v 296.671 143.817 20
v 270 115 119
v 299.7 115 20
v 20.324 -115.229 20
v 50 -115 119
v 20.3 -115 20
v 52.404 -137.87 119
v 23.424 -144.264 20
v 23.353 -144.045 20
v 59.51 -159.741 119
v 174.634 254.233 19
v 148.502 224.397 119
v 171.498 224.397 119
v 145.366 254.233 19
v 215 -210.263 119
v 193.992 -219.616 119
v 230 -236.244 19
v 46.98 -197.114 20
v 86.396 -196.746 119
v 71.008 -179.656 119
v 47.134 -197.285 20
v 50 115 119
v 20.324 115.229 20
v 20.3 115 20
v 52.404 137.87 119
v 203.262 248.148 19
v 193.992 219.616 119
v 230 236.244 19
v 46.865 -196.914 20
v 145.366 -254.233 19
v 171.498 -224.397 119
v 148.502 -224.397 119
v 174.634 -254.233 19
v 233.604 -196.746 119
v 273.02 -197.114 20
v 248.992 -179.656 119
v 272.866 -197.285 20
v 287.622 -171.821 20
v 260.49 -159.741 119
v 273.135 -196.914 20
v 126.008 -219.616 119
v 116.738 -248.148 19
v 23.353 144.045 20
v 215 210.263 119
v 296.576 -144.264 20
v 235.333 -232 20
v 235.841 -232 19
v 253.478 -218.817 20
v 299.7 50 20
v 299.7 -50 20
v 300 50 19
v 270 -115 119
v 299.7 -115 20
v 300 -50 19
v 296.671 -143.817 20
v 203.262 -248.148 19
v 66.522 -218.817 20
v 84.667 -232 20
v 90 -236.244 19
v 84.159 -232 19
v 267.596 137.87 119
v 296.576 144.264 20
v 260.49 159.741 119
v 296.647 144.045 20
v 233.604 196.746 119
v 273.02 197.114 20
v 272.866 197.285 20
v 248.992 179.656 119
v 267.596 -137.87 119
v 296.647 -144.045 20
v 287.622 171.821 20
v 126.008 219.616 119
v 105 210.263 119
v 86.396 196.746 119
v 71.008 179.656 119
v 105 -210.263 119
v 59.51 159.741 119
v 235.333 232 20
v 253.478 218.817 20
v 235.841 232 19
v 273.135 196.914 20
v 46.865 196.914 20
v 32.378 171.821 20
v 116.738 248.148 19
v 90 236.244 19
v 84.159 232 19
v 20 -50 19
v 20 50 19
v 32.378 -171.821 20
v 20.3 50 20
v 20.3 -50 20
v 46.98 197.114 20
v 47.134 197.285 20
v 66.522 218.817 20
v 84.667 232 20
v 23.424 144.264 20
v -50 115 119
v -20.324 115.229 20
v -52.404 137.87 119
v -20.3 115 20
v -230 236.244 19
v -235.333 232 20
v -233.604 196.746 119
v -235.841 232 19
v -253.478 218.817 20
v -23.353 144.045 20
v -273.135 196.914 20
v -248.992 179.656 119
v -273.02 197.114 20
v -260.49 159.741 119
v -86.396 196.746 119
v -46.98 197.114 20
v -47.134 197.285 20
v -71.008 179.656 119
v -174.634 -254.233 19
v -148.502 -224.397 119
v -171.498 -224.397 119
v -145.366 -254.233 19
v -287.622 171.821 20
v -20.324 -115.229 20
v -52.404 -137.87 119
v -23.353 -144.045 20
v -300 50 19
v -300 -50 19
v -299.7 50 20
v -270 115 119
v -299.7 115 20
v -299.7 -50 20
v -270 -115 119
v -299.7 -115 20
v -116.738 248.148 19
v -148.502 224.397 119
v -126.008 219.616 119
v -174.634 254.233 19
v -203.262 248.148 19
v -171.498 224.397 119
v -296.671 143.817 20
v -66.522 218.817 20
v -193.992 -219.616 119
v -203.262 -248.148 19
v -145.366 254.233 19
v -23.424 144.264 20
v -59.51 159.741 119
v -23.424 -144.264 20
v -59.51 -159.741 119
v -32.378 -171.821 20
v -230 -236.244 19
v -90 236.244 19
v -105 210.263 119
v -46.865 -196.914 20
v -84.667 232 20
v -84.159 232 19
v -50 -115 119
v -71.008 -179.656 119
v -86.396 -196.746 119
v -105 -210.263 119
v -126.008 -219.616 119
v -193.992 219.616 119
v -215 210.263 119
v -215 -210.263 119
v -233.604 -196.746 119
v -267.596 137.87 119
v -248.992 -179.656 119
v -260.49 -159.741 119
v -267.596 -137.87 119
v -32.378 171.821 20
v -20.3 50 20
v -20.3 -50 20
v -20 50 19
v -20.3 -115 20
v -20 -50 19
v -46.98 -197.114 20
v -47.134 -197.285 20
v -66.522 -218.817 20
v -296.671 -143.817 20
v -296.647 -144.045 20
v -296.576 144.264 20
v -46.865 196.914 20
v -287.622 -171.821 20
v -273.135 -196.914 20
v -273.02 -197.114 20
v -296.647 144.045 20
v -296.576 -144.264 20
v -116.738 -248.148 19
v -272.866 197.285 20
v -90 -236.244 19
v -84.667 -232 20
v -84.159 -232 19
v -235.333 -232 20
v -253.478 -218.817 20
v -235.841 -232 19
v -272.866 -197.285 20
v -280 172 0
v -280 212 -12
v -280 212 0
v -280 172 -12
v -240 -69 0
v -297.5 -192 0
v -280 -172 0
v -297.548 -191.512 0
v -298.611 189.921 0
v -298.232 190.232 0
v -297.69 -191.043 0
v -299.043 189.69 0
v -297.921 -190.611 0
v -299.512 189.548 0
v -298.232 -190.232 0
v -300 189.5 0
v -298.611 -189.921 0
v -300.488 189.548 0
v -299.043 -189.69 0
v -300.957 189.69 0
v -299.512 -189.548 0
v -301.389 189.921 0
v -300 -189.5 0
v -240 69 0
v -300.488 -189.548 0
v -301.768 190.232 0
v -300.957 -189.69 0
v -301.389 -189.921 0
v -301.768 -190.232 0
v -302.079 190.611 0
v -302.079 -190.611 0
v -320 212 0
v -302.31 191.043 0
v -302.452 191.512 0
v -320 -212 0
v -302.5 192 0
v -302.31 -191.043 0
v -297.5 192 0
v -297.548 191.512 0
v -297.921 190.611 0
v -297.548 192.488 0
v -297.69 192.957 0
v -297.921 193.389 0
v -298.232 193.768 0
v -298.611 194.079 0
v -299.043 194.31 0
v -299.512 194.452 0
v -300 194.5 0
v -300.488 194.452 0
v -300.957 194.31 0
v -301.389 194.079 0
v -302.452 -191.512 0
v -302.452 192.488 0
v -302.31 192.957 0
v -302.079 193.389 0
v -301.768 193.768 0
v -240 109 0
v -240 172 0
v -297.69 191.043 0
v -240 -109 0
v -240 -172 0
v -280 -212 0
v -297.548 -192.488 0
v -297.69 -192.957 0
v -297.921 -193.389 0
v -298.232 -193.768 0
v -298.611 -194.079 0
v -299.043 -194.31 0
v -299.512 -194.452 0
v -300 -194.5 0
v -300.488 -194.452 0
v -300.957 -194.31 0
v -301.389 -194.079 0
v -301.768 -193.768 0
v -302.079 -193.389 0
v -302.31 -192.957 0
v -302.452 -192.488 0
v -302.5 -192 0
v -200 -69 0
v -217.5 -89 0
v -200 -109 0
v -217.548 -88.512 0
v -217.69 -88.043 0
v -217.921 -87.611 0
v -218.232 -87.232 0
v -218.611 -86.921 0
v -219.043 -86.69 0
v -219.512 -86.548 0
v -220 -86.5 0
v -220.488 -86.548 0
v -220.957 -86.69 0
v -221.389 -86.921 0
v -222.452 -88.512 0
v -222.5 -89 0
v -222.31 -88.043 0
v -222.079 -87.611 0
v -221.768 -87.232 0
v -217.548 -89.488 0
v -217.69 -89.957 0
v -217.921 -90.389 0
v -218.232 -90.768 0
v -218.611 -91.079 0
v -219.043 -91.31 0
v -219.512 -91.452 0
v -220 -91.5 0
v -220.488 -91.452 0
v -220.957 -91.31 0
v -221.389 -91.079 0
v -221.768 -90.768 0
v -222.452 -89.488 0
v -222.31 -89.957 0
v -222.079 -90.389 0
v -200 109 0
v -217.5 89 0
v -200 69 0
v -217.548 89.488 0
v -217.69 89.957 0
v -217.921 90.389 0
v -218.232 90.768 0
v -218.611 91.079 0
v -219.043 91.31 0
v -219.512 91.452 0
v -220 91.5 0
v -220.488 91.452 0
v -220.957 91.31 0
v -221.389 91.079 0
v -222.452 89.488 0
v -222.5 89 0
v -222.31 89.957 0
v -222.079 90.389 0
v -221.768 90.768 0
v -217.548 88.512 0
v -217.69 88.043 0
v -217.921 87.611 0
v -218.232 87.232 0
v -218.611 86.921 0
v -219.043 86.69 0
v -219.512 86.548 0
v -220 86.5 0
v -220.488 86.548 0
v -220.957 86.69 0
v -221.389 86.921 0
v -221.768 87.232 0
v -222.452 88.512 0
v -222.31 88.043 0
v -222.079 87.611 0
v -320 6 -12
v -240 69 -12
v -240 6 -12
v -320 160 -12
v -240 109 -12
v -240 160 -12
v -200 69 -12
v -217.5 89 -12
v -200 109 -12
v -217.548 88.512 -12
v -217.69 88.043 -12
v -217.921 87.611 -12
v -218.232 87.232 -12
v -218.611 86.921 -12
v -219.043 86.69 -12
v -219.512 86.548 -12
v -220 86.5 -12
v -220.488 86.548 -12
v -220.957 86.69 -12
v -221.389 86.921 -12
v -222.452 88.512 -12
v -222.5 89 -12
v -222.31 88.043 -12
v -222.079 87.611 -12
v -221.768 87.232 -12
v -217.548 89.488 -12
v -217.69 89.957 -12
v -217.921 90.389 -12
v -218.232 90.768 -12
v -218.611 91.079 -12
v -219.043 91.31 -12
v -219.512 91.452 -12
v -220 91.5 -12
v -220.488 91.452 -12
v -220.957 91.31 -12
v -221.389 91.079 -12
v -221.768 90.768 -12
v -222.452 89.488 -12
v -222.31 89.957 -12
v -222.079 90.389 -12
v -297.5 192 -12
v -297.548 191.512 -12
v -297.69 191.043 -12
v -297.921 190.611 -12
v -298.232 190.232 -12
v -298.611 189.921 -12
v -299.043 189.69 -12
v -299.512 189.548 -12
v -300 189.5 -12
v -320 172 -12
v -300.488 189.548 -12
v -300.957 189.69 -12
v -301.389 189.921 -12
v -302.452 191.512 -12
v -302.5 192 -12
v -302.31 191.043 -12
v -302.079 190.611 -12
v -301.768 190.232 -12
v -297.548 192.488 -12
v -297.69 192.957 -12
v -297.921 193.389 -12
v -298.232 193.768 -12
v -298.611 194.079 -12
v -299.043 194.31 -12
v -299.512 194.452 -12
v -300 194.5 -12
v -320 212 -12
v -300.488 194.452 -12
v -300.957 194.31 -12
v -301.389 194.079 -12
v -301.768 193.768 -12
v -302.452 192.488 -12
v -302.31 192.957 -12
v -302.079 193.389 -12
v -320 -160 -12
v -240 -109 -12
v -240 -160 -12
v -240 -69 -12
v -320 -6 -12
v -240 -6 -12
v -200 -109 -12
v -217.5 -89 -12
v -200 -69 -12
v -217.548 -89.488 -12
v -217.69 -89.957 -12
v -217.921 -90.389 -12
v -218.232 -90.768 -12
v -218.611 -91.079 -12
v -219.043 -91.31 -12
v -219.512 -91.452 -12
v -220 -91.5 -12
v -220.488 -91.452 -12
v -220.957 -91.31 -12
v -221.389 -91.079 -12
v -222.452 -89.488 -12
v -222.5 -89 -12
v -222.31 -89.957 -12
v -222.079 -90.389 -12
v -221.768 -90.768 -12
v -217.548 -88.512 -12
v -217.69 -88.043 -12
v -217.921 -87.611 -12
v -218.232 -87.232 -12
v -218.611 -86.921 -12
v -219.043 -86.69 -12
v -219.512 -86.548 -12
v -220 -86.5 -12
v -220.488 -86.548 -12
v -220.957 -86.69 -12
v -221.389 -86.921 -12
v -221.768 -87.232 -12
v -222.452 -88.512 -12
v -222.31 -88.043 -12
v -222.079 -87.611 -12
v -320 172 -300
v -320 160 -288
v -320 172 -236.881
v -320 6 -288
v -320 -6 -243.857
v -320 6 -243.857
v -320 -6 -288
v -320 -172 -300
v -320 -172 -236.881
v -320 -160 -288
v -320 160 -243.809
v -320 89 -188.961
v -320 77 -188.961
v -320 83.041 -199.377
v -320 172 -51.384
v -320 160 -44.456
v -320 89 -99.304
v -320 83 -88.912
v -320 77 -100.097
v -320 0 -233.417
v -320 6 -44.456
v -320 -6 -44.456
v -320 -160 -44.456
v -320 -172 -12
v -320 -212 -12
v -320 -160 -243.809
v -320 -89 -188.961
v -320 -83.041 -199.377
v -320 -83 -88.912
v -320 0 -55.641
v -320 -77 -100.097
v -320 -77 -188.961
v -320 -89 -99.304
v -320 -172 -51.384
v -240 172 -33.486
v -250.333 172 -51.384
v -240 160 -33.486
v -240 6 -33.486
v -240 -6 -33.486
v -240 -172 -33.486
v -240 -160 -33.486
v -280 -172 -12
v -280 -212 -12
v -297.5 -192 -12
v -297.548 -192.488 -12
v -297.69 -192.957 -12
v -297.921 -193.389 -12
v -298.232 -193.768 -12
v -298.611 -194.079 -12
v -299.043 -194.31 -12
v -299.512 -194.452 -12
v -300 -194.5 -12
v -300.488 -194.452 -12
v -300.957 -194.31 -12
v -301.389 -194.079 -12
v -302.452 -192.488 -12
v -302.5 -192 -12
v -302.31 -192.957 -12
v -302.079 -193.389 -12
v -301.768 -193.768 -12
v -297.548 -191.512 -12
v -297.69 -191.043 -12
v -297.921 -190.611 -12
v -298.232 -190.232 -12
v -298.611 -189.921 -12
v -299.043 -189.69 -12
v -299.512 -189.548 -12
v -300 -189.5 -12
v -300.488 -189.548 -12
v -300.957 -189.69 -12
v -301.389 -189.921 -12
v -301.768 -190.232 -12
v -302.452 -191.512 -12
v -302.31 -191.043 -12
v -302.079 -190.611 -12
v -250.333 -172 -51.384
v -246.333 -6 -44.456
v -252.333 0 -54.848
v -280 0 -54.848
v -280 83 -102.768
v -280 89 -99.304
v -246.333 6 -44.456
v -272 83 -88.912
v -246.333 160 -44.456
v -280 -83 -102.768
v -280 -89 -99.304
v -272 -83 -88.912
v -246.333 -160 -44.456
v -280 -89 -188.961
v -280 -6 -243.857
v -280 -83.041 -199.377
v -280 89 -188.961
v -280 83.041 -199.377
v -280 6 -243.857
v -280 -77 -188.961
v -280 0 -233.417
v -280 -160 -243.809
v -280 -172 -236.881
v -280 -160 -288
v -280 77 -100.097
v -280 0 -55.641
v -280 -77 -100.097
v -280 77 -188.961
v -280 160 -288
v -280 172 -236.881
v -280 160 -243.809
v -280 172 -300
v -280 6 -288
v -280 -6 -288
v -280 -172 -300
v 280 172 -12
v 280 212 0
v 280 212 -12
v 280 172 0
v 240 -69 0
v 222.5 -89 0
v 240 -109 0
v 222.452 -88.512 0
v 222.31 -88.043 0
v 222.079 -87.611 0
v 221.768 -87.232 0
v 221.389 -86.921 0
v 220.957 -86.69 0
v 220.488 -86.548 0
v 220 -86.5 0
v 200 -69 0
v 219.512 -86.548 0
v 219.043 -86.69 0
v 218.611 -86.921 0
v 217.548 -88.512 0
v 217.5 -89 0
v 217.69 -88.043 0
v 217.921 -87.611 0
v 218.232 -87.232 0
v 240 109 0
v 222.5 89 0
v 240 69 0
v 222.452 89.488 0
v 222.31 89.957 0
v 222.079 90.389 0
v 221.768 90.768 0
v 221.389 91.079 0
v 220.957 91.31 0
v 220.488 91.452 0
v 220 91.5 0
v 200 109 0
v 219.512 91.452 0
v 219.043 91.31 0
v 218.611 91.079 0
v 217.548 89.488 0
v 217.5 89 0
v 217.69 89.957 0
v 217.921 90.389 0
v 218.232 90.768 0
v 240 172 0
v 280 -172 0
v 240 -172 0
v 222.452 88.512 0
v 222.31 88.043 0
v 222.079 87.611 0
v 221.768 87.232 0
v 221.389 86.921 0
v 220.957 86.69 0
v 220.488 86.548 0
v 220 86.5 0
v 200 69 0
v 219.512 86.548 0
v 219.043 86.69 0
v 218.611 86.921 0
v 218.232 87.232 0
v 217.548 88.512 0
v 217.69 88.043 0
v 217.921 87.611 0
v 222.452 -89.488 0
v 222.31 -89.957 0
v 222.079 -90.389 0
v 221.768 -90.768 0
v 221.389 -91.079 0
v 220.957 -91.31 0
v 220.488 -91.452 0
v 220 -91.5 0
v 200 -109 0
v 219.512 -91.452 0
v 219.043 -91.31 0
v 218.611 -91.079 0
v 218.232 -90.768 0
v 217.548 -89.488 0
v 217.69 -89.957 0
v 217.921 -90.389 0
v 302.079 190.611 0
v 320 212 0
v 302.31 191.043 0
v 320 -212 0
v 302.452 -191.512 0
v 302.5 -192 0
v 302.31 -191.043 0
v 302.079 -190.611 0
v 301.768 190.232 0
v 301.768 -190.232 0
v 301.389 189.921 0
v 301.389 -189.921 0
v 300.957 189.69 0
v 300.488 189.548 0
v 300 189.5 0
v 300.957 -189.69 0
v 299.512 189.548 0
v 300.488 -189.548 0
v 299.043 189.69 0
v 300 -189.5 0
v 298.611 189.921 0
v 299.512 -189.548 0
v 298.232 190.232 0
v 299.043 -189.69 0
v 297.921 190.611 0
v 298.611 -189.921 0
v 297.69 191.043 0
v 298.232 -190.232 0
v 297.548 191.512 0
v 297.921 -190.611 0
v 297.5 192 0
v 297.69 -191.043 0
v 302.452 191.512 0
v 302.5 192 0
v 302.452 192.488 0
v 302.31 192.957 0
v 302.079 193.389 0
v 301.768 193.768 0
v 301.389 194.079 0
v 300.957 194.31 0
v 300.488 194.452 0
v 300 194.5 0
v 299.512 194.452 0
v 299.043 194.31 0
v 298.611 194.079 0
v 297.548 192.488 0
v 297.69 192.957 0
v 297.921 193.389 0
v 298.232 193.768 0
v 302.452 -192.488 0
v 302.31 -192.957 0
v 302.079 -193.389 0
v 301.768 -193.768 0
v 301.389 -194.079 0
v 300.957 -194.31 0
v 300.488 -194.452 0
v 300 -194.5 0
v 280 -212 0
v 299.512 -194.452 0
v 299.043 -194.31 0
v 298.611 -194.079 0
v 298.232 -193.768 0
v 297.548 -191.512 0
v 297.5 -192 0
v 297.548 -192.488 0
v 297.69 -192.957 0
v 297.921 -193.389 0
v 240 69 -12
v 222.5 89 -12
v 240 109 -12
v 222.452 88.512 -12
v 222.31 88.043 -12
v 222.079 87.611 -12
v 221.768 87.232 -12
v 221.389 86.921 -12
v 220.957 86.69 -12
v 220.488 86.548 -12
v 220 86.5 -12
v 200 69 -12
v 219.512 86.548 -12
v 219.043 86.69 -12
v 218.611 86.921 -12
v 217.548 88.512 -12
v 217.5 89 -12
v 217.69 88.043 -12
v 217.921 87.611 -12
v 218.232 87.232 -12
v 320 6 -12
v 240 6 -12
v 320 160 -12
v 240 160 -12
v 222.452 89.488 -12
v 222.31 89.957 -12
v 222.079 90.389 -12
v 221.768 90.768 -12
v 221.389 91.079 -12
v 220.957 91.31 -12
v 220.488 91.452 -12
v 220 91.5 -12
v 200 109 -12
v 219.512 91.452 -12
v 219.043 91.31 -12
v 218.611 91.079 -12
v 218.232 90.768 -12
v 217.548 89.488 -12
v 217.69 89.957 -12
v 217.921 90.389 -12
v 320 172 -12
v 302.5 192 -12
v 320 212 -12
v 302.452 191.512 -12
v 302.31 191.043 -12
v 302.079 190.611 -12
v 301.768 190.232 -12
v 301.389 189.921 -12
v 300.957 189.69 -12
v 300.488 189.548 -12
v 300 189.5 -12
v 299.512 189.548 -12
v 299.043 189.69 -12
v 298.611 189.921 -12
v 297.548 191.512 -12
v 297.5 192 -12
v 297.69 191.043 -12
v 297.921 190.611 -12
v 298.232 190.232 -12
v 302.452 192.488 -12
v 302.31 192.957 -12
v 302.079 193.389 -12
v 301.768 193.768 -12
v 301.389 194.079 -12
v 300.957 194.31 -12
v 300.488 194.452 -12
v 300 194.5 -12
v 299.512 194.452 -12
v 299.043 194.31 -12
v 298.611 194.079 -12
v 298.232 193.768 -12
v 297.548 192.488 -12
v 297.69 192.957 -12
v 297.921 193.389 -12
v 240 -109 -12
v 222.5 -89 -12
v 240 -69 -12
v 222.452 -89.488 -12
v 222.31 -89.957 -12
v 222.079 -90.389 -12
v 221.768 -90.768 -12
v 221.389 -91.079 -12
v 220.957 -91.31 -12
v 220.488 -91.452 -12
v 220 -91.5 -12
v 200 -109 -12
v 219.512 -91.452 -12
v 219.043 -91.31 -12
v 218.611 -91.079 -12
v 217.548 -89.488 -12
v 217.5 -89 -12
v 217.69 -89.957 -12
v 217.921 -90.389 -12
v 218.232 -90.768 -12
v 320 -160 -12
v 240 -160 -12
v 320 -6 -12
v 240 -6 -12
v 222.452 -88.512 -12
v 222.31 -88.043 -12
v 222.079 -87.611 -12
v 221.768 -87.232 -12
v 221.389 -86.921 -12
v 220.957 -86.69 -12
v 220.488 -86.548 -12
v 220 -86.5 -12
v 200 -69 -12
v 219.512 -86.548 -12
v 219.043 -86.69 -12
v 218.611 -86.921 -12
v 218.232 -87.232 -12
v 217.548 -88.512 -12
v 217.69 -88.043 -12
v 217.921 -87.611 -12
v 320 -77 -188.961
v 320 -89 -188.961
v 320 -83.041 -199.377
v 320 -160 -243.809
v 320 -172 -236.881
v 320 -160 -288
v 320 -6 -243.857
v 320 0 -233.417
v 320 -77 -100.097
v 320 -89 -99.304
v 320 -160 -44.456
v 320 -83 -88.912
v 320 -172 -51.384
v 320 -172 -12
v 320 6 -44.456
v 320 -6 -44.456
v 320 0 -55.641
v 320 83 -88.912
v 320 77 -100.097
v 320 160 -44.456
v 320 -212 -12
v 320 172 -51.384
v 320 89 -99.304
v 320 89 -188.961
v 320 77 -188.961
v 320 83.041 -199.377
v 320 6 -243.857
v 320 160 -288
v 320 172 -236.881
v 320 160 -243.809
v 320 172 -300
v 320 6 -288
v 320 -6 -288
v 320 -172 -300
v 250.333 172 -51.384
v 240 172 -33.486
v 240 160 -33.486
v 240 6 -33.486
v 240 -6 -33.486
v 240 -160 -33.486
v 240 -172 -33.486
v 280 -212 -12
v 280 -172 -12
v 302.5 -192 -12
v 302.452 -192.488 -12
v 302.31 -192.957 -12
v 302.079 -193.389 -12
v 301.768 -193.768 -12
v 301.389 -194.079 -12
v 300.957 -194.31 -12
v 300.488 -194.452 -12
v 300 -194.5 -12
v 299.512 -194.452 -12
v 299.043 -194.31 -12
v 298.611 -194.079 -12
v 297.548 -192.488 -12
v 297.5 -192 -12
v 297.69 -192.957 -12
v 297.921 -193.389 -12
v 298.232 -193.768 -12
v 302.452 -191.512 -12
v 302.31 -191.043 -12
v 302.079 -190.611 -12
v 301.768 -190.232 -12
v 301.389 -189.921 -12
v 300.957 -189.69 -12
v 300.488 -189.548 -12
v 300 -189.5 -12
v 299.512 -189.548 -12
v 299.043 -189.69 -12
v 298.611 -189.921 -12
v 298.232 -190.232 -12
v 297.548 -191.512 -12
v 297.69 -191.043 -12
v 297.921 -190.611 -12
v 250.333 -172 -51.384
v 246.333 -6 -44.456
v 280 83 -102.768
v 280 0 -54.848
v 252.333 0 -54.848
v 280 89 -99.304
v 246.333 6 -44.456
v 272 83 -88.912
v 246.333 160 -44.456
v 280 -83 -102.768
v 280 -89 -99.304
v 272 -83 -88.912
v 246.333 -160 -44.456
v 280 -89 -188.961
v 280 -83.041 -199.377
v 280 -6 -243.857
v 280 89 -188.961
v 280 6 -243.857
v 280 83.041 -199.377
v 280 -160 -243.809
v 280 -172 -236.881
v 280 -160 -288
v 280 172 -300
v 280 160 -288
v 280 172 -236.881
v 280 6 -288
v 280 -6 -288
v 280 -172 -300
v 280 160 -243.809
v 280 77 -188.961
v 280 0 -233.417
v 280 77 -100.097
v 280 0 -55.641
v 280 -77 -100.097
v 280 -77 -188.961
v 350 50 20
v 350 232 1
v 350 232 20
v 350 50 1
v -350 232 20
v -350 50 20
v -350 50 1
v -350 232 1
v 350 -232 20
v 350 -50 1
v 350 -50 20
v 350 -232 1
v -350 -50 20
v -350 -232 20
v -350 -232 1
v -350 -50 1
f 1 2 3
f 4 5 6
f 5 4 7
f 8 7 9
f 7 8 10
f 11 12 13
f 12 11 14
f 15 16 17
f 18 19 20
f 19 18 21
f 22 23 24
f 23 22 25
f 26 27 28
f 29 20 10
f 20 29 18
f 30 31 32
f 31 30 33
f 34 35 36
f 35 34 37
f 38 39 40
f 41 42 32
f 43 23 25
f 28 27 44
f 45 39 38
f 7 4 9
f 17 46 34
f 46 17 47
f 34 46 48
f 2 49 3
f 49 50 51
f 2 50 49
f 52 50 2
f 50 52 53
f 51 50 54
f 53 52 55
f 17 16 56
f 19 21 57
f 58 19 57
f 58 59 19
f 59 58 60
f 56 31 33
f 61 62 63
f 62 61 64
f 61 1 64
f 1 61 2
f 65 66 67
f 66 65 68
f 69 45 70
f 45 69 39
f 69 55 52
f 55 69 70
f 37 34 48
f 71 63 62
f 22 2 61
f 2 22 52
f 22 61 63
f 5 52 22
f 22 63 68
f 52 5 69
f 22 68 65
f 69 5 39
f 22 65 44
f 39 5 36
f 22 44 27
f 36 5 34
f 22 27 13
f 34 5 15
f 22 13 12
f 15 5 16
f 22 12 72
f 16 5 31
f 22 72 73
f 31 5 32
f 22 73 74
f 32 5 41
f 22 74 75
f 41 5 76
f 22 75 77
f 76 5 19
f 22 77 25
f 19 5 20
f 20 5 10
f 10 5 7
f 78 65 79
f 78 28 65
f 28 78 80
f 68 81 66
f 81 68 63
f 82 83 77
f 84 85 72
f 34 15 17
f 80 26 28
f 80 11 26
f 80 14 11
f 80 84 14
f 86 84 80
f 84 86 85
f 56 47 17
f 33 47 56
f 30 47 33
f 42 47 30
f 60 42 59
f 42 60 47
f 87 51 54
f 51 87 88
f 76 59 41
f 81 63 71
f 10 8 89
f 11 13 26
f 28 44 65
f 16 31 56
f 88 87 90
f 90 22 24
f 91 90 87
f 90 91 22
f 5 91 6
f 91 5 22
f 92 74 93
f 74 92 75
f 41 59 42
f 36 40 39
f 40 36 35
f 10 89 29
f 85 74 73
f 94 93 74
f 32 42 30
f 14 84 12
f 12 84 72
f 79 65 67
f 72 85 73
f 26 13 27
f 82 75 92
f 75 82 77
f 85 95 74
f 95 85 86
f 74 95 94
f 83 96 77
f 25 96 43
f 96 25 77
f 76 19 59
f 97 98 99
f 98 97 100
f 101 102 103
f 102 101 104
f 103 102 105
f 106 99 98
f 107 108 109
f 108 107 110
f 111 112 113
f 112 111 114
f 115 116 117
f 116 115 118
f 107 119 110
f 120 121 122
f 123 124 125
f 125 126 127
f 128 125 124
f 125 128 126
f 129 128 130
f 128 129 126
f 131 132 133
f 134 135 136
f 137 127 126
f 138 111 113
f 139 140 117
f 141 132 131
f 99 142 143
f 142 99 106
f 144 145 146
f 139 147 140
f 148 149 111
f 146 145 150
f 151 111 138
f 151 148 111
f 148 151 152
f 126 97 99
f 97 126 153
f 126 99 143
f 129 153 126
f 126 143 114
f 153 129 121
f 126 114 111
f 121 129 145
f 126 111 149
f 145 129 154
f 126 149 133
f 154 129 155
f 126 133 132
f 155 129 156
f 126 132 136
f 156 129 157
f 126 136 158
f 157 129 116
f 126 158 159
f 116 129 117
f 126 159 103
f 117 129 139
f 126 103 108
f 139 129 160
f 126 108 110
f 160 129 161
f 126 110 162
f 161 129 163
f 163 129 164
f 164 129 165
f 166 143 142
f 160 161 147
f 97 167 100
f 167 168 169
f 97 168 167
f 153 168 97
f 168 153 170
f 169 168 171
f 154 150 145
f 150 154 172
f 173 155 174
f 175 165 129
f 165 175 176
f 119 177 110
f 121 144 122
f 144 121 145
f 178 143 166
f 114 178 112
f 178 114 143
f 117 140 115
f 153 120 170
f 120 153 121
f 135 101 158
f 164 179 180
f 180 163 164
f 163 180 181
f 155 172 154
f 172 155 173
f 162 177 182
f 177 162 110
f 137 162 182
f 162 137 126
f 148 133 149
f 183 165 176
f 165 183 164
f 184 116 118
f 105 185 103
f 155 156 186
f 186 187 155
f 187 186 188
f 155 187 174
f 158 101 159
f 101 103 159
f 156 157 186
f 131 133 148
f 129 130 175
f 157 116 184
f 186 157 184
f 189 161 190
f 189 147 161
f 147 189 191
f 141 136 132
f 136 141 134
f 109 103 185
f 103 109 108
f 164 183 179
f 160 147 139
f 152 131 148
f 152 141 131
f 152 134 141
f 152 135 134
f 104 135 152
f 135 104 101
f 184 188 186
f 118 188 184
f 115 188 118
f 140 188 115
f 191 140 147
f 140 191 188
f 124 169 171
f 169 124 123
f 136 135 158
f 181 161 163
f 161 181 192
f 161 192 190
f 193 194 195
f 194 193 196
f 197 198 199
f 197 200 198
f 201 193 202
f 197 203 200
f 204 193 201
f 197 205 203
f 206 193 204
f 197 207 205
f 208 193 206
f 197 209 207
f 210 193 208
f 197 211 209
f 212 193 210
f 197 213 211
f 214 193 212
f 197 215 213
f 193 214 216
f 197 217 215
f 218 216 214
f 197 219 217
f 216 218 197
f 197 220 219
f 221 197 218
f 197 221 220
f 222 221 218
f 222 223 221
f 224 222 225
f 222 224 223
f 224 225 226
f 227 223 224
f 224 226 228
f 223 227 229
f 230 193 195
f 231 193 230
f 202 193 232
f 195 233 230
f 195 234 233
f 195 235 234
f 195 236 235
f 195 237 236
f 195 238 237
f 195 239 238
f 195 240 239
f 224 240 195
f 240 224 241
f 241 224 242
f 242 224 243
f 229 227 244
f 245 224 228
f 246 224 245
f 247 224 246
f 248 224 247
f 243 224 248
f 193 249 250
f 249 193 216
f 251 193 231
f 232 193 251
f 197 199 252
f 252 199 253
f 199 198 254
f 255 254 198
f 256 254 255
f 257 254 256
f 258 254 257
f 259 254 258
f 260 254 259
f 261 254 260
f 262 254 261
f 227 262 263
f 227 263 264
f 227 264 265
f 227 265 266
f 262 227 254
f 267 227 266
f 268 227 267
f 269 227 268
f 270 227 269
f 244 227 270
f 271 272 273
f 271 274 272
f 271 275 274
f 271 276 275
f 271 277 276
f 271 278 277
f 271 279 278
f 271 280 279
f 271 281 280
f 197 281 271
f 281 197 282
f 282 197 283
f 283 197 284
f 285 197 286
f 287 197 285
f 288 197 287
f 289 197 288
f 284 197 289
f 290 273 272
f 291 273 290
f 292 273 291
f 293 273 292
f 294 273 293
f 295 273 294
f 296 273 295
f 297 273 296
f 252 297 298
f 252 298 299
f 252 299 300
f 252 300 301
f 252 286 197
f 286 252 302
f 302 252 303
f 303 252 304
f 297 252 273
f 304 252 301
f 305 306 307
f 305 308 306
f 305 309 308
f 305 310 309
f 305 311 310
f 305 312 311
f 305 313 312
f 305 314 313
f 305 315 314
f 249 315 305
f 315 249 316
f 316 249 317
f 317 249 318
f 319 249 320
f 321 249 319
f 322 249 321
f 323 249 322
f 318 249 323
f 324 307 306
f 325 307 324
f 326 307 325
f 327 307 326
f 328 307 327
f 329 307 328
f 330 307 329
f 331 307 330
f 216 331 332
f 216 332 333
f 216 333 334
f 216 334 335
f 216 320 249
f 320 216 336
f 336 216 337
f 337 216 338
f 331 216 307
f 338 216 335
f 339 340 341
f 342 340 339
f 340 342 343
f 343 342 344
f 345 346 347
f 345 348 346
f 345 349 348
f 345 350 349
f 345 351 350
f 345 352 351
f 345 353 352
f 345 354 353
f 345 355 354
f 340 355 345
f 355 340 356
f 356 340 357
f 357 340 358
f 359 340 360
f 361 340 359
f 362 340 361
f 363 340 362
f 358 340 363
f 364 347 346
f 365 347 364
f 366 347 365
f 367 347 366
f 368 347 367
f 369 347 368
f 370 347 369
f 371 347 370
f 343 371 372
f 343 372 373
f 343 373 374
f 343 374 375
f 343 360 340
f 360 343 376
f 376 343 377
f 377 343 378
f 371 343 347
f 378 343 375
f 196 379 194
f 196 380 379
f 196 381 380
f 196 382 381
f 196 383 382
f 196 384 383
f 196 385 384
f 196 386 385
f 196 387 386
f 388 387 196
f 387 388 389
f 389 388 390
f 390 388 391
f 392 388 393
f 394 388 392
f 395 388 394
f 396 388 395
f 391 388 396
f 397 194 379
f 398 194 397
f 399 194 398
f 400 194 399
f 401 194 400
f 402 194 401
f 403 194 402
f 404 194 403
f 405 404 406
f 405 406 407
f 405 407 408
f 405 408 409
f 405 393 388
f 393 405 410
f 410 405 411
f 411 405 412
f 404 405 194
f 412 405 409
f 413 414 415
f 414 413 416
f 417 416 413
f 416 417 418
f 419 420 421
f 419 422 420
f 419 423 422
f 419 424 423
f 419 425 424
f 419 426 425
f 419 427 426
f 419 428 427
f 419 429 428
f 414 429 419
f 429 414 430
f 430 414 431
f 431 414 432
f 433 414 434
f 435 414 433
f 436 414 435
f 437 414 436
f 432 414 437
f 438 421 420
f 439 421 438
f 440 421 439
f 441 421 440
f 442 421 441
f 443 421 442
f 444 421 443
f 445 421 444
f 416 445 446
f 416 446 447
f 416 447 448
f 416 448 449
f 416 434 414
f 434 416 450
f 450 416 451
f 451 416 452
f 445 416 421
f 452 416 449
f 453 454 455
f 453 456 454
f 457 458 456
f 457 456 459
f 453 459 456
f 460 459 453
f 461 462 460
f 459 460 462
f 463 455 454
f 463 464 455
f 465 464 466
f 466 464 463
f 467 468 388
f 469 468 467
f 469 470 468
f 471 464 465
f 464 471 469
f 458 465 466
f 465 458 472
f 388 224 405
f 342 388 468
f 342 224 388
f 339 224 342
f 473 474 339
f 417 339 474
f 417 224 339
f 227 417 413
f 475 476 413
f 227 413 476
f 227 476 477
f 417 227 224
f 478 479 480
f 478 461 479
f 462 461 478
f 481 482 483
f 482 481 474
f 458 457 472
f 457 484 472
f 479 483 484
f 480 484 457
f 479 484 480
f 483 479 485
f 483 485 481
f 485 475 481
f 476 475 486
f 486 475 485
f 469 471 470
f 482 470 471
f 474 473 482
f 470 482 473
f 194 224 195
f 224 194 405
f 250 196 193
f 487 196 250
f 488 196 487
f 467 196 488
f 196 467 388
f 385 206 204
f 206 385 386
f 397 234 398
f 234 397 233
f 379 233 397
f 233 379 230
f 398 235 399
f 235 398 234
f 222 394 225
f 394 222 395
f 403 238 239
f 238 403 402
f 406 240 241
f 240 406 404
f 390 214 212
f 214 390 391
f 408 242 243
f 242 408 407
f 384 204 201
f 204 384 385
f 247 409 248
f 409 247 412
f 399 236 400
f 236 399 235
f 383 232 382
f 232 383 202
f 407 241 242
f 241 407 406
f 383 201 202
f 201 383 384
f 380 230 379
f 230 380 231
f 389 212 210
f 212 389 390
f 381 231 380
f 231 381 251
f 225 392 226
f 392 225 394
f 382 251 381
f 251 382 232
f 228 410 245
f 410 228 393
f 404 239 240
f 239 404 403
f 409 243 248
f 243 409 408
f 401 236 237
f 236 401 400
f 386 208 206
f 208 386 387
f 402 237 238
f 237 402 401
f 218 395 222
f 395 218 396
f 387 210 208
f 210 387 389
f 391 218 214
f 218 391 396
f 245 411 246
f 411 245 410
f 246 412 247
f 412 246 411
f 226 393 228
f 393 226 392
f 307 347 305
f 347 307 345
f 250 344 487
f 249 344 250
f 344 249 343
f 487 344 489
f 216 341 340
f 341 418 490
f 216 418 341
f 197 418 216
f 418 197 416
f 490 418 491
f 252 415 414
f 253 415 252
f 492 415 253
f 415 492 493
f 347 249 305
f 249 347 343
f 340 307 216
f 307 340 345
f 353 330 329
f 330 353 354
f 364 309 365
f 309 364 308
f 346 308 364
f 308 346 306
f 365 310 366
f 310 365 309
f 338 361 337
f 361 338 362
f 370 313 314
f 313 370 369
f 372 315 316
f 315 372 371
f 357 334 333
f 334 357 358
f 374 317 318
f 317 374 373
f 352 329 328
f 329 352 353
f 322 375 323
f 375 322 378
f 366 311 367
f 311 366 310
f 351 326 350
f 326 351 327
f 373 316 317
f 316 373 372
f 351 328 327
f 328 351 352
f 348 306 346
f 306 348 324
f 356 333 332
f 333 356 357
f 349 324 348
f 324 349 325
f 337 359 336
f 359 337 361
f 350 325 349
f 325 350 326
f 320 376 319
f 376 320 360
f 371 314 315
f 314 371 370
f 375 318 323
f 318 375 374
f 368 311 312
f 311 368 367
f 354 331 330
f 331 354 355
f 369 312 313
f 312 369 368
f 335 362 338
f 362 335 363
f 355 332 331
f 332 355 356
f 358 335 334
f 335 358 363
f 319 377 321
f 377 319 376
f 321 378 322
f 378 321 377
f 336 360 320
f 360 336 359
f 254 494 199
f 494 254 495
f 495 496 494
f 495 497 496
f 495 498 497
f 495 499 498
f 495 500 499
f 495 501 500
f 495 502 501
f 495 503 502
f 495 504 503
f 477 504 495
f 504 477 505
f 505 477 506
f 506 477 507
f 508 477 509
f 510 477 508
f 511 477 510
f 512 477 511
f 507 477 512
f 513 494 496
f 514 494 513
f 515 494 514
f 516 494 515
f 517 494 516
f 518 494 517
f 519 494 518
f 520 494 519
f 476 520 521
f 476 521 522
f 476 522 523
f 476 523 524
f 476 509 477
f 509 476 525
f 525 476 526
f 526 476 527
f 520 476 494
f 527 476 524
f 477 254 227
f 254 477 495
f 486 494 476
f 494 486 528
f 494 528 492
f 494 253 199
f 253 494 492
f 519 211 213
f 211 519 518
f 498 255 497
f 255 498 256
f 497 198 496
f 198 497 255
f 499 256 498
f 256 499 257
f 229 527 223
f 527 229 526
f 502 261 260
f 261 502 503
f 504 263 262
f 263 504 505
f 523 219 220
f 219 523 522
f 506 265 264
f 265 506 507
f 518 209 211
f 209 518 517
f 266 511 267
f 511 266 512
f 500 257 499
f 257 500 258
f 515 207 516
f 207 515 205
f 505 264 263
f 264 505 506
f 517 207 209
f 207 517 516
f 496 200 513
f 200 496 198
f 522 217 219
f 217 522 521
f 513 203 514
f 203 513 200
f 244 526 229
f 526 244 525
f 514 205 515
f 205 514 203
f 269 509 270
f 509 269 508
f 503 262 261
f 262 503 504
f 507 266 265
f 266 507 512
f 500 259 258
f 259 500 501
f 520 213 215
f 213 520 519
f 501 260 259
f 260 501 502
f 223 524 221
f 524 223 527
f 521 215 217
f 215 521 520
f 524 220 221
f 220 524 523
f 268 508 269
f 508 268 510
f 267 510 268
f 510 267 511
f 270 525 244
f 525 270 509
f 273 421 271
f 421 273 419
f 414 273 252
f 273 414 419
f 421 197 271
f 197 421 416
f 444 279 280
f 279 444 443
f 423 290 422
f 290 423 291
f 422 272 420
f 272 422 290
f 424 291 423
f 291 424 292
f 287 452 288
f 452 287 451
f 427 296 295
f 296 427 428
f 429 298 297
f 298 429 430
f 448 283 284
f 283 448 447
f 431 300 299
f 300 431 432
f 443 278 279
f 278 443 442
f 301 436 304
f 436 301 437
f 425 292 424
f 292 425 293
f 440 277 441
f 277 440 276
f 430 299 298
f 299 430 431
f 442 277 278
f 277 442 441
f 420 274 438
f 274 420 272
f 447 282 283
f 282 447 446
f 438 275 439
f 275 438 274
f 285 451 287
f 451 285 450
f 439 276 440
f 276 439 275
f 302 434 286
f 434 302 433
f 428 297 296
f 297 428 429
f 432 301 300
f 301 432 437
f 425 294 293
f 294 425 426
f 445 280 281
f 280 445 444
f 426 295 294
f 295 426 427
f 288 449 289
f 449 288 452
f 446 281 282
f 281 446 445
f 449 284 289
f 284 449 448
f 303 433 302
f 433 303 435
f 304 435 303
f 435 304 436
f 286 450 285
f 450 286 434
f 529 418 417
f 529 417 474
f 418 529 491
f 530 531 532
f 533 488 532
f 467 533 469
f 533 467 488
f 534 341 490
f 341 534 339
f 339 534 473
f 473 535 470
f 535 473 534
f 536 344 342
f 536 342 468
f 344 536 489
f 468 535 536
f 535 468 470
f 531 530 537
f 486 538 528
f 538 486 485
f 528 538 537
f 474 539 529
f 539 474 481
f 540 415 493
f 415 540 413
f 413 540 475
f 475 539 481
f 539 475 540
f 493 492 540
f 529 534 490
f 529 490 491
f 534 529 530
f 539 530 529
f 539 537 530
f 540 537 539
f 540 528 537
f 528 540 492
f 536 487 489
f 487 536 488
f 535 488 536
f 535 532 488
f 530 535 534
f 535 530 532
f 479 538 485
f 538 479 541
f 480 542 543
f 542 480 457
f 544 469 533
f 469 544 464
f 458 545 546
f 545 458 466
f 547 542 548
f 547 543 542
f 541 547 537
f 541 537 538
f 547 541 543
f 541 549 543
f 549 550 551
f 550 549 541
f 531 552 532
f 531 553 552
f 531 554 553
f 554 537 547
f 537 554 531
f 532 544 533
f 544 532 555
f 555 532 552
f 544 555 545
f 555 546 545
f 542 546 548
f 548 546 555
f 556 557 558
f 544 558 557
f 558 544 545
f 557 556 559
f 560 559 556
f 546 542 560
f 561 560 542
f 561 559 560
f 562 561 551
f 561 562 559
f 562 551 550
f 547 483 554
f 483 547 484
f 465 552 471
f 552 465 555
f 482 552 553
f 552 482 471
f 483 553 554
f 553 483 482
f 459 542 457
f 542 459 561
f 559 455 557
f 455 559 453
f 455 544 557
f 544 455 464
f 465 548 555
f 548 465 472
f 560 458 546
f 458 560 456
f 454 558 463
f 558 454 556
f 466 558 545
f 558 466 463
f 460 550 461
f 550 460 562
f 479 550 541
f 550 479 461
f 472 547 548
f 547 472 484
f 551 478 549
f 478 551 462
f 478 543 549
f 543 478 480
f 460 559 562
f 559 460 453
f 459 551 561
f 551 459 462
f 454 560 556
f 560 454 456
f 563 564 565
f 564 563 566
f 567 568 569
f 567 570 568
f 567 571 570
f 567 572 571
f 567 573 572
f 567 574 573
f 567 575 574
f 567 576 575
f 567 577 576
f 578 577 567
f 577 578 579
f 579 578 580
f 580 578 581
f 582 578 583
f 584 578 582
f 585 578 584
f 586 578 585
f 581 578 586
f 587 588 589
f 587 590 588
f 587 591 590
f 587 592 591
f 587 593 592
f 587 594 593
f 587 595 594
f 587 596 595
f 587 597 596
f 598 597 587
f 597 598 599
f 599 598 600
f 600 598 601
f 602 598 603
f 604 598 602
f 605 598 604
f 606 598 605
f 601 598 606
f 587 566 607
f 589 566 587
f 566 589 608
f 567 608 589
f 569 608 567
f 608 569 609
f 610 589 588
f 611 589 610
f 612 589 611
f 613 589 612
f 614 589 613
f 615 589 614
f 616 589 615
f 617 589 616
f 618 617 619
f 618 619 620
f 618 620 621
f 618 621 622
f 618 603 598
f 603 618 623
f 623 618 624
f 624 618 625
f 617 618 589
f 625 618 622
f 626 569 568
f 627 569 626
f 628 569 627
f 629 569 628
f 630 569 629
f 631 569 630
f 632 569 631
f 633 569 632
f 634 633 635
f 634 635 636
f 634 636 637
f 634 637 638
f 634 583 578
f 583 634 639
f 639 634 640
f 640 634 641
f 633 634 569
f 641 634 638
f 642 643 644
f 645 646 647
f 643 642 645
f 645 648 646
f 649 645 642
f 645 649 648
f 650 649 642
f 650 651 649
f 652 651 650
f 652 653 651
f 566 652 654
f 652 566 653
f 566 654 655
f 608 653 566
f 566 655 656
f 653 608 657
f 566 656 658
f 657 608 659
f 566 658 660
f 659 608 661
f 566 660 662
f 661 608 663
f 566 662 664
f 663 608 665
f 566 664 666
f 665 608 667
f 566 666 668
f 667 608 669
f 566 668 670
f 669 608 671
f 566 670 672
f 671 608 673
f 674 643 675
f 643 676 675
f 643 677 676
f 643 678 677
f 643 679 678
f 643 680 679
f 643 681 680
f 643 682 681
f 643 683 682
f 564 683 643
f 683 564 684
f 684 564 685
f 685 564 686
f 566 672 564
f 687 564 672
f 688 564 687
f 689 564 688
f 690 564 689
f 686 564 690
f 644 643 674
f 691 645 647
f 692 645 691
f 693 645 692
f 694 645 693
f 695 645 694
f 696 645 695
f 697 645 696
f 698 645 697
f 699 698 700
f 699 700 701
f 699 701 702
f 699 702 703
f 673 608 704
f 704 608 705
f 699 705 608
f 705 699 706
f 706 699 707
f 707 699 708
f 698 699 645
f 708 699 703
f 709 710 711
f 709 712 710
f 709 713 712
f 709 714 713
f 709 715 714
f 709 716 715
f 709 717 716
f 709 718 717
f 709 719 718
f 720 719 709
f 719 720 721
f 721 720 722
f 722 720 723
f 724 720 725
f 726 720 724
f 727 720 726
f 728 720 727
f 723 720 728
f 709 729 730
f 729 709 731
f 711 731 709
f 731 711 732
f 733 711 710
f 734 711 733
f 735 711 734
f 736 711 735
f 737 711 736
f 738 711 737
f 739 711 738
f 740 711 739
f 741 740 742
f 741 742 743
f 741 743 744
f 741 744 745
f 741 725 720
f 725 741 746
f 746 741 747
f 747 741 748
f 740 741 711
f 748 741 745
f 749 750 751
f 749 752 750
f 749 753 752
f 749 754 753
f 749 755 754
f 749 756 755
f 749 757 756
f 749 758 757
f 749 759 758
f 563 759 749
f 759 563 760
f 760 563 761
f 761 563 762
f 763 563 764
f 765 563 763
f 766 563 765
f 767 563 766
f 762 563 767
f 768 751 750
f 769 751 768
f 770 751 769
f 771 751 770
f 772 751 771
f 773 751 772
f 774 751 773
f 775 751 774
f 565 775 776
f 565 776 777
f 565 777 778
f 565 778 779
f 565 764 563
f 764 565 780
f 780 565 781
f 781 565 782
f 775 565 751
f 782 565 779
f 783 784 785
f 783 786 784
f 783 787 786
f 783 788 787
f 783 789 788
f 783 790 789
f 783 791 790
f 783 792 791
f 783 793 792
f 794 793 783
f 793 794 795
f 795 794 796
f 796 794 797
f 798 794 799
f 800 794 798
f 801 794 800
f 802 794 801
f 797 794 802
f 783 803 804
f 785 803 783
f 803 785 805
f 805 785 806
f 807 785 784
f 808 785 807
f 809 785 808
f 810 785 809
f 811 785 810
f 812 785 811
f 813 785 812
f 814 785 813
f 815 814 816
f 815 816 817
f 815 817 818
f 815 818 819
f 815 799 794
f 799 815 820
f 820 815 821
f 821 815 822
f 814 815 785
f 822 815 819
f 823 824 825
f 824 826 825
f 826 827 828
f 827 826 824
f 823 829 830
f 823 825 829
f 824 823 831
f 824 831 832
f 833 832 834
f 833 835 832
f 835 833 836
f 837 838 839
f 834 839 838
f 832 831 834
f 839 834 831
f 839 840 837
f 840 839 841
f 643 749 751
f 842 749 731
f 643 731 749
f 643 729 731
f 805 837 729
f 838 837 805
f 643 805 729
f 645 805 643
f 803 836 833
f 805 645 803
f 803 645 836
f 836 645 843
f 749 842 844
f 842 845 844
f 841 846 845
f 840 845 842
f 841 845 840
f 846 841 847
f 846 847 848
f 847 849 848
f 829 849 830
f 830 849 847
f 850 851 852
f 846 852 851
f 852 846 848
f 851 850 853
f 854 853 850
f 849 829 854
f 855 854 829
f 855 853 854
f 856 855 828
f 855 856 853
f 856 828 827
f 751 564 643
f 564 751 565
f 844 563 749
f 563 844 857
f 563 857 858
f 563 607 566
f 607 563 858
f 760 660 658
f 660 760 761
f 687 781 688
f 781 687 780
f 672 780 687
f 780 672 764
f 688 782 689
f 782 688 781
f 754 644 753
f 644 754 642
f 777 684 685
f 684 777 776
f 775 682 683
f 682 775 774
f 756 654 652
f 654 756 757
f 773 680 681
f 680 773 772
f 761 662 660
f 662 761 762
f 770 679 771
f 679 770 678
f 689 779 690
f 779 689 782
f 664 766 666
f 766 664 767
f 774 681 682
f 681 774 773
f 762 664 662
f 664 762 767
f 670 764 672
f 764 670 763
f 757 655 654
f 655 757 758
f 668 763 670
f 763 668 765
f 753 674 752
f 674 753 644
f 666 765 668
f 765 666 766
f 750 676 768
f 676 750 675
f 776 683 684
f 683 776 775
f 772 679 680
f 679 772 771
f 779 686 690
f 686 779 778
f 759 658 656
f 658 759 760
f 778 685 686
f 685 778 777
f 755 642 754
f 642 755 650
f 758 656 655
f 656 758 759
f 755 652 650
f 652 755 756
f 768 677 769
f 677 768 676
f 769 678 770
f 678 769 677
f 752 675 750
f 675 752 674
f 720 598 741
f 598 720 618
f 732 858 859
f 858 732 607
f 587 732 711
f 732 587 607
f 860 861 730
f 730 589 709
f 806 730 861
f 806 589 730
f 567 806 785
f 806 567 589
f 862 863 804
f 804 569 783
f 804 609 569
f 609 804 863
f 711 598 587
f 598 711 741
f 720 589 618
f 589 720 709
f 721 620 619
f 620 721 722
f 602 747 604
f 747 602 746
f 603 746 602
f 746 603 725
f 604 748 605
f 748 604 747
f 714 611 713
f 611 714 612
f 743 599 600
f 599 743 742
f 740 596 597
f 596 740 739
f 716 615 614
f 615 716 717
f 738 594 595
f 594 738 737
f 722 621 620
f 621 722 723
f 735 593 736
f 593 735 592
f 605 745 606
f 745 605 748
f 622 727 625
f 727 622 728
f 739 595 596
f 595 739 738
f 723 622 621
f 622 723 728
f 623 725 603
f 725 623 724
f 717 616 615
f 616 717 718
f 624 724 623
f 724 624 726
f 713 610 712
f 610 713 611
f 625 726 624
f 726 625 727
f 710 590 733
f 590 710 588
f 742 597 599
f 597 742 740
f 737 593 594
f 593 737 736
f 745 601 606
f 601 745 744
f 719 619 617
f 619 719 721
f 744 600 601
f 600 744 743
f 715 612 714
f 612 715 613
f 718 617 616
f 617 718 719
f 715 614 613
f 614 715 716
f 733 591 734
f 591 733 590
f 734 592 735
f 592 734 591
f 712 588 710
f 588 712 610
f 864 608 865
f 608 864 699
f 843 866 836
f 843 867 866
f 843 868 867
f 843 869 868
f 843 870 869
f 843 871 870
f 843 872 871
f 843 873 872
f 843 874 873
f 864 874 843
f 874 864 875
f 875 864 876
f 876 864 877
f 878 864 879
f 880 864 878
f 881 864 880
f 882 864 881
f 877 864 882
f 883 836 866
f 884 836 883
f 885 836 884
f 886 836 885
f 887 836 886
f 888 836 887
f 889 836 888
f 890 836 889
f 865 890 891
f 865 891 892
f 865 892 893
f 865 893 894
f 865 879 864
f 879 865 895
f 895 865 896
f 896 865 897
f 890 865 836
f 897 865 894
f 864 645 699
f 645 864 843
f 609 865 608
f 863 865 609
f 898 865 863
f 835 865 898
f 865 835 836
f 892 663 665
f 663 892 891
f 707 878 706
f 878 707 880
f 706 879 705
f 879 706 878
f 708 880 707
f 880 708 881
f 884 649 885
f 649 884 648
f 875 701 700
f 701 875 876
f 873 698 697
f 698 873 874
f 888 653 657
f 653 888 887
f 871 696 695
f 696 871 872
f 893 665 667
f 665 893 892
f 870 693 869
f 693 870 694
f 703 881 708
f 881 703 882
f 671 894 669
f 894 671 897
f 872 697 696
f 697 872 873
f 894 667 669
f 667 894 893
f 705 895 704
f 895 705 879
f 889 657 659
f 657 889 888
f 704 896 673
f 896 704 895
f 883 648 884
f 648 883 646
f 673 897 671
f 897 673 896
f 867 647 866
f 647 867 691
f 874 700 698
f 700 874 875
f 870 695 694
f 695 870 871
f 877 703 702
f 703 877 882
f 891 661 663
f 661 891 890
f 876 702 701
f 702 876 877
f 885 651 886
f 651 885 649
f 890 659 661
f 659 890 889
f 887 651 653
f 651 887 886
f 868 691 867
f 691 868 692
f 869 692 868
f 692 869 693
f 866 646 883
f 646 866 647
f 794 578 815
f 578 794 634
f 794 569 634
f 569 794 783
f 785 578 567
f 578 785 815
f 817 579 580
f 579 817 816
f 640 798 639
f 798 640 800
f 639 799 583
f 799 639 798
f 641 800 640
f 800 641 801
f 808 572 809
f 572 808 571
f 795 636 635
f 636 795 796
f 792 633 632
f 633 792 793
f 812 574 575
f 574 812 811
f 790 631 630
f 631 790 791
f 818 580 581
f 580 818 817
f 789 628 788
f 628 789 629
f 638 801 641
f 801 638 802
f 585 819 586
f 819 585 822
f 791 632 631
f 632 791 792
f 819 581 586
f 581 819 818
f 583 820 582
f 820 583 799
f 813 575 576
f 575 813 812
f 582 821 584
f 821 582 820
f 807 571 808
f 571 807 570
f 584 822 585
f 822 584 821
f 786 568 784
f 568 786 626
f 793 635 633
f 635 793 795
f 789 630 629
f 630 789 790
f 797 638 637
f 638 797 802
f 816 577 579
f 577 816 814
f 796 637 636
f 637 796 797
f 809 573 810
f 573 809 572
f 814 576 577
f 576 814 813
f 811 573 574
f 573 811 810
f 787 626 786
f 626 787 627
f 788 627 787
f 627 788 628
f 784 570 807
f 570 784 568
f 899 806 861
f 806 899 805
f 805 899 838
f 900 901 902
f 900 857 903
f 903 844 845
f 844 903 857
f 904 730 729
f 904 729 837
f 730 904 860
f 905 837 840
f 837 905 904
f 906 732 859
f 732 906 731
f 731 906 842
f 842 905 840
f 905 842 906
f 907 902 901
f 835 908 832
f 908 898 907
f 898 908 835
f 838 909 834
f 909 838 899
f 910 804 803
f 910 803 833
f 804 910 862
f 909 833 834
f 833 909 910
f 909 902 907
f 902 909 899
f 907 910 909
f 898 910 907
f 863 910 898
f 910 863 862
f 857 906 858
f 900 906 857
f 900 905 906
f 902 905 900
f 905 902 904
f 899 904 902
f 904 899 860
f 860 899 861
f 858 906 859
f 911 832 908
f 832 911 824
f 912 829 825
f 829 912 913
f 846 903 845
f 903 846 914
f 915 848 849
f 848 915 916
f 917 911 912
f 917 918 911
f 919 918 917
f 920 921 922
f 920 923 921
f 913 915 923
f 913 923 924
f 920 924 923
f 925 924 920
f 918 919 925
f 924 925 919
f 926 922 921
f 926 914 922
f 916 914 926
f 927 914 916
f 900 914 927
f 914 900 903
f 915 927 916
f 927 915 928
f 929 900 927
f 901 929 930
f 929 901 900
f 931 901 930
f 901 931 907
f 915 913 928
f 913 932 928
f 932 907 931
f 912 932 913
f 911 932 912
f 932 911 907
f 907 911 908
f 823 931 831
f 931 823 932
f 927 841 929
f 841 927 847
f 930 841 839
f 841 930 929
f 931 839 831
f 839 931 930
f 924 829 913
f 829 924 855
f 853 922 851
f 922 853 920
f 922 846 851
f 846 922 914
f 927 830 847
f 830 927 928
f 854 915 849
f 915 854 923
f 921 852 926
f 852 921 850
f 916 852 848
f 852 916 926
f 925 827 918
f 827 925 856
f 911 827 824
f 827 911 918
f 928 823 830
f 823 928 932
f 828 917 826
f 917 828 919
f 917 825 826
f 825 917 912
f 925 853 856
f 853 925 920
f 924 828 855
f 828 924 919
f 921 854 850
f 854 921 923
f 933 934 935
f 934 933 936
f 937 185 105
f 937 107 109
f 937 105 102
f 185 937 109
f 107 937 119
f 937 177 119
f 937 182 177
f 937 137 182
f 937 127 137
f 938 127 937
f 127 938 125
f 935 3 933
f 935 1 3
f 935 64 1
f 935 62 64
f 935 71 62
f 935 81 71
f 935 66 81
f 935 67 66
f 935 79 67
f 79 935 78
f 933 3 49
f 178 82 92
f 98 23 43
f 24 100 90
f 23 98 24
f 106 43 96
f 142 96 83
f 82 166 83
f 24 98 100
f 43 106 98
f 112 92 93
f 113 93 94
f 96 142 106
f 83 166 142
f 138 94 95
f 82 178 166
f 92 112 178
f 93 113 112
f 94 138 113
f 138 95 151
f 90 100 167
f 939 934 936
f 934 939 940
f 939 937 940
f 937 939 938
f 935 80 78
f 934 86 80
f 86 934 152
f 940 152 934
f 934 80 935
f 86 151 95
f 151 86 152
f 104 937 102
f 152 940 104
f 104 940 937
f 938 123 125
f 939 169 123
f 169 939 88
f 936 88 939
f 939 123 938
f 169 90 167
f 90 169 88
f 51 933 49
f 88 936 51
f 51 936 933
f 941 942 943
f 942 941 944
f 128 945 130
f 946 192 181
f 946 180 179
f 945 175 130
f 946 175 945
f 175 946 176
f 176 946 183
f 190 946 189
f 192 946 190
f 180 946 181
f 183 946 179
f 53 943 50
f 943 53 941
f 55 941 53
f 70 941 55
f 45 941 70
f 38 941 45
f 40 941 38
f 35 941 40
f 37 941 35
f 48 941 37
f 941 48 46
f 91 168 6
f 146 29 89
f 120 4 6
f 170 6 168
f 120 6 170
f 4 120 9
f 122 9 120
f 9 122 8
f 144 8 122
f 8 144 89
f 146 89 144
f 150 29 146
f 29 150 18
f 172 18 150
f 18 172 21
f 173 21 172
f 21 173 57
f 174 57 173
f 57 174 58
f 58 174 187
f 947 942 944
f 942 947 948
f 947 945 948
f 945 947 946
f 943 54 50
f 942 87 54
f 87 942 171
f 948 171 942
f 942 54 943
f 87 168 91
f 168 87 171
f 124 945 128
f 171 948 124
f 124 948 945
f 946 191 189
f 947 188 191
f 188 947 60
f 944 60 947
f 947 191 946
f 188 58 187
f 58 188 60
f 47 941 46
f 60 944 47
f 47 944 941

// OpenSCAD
color("lightblue") {
  translate([160,0,0]) bowl();
  translate([-160,0,0]) bowl();
}

translate([0,50,1]) board();
mirror([0,1,0]) translate([0,50,1]) board();

color("#303030")  {
translate([-320,0,0]) foot();
mirror([1,0,0]) translate([-320,0,0]) foot();
}


// printableFoot();


module printableFoot() {
  intersection() {
    foot();
    translate([-50,0,-1000]) cube([1000, 1000, 1000]);
  }
}

module foot() {
  sr=89;
  h=40;
  t=12;
  translate([0,sr*2-t/2,-t]) screwTab(h,t);
  translate([h*2,sr-h/2,-t]) screwTab(h,t);

  mirror([0,1,0]) {
    translate([0,sr*2-t/2,-t]) screwTab(h,t);
    translate([h*2,sr-h/2,-t]) screwTab(h,t);
  }

  translate([0,-sr*2+t/2,-t]) cube([h*2,sr*4-t,t]);
  translate([0,-sr*2+t/2,-300]) cube([h,sr*4-t,t]);

  intersection() {
    translate([0,-250,-300]) cube([700,500,300]);
      union() {
      difference() {
        union() {
          translate([0,sr-t/2,0]) hexBit(sr,h*2,t);
          mirror([0,1,0]) translate([0,sr-t/2,0]) hexBit(sr,h*2,t);
        }
        translate([h,-300,-hexCircumradius(sr)]) rotate([0,30,0]) cube([100,600,300]);
      }

      translate([0,0,-hexCircumradius(sr*1.5)+t*0.8]) hexBit(sr,h,t);

      translate([0,0,-hexCircumradius(sr*3)+t*1.67]) {
        translate([0,sr-t/2,0]) hexBit(sr,h,t);
        mirror([0,1,0]) translate([0,sr-t/2,0]) hexBit(sr,h,t);
      }
    }
  }
}

module screwTab(h,t) {
  difference() {
    cube([h,h,t]);
    translate([h/2,h/2,-1]) cylinder(r=2.5,h=100,$fn=32);
  }
}

module hexBit(sr,h,t) {
  rotate([0,90,0]) difference() {
    cylinder(r=hexCircumradius(sr),h=h,$fn=6);
    translate([0,0,-1]) cylinder(r=hexCircumradius(sr-t),h=h+2,$fn=6);
  }
}

module bowl() {
  translate([0,0,19]) hull() {
    translate([0,115,0]) cylinder(r1=140, r2=110,h=100);
    translate([0,-115,0]) cylinder(r1=140, r2=110,h=100);
  }
}

module board() {
  translate([-350,0,0]) cube([700,182,19]);
}

function hexCircumradius(hexInradius) = hexInradius/sqrt(3)*2;
